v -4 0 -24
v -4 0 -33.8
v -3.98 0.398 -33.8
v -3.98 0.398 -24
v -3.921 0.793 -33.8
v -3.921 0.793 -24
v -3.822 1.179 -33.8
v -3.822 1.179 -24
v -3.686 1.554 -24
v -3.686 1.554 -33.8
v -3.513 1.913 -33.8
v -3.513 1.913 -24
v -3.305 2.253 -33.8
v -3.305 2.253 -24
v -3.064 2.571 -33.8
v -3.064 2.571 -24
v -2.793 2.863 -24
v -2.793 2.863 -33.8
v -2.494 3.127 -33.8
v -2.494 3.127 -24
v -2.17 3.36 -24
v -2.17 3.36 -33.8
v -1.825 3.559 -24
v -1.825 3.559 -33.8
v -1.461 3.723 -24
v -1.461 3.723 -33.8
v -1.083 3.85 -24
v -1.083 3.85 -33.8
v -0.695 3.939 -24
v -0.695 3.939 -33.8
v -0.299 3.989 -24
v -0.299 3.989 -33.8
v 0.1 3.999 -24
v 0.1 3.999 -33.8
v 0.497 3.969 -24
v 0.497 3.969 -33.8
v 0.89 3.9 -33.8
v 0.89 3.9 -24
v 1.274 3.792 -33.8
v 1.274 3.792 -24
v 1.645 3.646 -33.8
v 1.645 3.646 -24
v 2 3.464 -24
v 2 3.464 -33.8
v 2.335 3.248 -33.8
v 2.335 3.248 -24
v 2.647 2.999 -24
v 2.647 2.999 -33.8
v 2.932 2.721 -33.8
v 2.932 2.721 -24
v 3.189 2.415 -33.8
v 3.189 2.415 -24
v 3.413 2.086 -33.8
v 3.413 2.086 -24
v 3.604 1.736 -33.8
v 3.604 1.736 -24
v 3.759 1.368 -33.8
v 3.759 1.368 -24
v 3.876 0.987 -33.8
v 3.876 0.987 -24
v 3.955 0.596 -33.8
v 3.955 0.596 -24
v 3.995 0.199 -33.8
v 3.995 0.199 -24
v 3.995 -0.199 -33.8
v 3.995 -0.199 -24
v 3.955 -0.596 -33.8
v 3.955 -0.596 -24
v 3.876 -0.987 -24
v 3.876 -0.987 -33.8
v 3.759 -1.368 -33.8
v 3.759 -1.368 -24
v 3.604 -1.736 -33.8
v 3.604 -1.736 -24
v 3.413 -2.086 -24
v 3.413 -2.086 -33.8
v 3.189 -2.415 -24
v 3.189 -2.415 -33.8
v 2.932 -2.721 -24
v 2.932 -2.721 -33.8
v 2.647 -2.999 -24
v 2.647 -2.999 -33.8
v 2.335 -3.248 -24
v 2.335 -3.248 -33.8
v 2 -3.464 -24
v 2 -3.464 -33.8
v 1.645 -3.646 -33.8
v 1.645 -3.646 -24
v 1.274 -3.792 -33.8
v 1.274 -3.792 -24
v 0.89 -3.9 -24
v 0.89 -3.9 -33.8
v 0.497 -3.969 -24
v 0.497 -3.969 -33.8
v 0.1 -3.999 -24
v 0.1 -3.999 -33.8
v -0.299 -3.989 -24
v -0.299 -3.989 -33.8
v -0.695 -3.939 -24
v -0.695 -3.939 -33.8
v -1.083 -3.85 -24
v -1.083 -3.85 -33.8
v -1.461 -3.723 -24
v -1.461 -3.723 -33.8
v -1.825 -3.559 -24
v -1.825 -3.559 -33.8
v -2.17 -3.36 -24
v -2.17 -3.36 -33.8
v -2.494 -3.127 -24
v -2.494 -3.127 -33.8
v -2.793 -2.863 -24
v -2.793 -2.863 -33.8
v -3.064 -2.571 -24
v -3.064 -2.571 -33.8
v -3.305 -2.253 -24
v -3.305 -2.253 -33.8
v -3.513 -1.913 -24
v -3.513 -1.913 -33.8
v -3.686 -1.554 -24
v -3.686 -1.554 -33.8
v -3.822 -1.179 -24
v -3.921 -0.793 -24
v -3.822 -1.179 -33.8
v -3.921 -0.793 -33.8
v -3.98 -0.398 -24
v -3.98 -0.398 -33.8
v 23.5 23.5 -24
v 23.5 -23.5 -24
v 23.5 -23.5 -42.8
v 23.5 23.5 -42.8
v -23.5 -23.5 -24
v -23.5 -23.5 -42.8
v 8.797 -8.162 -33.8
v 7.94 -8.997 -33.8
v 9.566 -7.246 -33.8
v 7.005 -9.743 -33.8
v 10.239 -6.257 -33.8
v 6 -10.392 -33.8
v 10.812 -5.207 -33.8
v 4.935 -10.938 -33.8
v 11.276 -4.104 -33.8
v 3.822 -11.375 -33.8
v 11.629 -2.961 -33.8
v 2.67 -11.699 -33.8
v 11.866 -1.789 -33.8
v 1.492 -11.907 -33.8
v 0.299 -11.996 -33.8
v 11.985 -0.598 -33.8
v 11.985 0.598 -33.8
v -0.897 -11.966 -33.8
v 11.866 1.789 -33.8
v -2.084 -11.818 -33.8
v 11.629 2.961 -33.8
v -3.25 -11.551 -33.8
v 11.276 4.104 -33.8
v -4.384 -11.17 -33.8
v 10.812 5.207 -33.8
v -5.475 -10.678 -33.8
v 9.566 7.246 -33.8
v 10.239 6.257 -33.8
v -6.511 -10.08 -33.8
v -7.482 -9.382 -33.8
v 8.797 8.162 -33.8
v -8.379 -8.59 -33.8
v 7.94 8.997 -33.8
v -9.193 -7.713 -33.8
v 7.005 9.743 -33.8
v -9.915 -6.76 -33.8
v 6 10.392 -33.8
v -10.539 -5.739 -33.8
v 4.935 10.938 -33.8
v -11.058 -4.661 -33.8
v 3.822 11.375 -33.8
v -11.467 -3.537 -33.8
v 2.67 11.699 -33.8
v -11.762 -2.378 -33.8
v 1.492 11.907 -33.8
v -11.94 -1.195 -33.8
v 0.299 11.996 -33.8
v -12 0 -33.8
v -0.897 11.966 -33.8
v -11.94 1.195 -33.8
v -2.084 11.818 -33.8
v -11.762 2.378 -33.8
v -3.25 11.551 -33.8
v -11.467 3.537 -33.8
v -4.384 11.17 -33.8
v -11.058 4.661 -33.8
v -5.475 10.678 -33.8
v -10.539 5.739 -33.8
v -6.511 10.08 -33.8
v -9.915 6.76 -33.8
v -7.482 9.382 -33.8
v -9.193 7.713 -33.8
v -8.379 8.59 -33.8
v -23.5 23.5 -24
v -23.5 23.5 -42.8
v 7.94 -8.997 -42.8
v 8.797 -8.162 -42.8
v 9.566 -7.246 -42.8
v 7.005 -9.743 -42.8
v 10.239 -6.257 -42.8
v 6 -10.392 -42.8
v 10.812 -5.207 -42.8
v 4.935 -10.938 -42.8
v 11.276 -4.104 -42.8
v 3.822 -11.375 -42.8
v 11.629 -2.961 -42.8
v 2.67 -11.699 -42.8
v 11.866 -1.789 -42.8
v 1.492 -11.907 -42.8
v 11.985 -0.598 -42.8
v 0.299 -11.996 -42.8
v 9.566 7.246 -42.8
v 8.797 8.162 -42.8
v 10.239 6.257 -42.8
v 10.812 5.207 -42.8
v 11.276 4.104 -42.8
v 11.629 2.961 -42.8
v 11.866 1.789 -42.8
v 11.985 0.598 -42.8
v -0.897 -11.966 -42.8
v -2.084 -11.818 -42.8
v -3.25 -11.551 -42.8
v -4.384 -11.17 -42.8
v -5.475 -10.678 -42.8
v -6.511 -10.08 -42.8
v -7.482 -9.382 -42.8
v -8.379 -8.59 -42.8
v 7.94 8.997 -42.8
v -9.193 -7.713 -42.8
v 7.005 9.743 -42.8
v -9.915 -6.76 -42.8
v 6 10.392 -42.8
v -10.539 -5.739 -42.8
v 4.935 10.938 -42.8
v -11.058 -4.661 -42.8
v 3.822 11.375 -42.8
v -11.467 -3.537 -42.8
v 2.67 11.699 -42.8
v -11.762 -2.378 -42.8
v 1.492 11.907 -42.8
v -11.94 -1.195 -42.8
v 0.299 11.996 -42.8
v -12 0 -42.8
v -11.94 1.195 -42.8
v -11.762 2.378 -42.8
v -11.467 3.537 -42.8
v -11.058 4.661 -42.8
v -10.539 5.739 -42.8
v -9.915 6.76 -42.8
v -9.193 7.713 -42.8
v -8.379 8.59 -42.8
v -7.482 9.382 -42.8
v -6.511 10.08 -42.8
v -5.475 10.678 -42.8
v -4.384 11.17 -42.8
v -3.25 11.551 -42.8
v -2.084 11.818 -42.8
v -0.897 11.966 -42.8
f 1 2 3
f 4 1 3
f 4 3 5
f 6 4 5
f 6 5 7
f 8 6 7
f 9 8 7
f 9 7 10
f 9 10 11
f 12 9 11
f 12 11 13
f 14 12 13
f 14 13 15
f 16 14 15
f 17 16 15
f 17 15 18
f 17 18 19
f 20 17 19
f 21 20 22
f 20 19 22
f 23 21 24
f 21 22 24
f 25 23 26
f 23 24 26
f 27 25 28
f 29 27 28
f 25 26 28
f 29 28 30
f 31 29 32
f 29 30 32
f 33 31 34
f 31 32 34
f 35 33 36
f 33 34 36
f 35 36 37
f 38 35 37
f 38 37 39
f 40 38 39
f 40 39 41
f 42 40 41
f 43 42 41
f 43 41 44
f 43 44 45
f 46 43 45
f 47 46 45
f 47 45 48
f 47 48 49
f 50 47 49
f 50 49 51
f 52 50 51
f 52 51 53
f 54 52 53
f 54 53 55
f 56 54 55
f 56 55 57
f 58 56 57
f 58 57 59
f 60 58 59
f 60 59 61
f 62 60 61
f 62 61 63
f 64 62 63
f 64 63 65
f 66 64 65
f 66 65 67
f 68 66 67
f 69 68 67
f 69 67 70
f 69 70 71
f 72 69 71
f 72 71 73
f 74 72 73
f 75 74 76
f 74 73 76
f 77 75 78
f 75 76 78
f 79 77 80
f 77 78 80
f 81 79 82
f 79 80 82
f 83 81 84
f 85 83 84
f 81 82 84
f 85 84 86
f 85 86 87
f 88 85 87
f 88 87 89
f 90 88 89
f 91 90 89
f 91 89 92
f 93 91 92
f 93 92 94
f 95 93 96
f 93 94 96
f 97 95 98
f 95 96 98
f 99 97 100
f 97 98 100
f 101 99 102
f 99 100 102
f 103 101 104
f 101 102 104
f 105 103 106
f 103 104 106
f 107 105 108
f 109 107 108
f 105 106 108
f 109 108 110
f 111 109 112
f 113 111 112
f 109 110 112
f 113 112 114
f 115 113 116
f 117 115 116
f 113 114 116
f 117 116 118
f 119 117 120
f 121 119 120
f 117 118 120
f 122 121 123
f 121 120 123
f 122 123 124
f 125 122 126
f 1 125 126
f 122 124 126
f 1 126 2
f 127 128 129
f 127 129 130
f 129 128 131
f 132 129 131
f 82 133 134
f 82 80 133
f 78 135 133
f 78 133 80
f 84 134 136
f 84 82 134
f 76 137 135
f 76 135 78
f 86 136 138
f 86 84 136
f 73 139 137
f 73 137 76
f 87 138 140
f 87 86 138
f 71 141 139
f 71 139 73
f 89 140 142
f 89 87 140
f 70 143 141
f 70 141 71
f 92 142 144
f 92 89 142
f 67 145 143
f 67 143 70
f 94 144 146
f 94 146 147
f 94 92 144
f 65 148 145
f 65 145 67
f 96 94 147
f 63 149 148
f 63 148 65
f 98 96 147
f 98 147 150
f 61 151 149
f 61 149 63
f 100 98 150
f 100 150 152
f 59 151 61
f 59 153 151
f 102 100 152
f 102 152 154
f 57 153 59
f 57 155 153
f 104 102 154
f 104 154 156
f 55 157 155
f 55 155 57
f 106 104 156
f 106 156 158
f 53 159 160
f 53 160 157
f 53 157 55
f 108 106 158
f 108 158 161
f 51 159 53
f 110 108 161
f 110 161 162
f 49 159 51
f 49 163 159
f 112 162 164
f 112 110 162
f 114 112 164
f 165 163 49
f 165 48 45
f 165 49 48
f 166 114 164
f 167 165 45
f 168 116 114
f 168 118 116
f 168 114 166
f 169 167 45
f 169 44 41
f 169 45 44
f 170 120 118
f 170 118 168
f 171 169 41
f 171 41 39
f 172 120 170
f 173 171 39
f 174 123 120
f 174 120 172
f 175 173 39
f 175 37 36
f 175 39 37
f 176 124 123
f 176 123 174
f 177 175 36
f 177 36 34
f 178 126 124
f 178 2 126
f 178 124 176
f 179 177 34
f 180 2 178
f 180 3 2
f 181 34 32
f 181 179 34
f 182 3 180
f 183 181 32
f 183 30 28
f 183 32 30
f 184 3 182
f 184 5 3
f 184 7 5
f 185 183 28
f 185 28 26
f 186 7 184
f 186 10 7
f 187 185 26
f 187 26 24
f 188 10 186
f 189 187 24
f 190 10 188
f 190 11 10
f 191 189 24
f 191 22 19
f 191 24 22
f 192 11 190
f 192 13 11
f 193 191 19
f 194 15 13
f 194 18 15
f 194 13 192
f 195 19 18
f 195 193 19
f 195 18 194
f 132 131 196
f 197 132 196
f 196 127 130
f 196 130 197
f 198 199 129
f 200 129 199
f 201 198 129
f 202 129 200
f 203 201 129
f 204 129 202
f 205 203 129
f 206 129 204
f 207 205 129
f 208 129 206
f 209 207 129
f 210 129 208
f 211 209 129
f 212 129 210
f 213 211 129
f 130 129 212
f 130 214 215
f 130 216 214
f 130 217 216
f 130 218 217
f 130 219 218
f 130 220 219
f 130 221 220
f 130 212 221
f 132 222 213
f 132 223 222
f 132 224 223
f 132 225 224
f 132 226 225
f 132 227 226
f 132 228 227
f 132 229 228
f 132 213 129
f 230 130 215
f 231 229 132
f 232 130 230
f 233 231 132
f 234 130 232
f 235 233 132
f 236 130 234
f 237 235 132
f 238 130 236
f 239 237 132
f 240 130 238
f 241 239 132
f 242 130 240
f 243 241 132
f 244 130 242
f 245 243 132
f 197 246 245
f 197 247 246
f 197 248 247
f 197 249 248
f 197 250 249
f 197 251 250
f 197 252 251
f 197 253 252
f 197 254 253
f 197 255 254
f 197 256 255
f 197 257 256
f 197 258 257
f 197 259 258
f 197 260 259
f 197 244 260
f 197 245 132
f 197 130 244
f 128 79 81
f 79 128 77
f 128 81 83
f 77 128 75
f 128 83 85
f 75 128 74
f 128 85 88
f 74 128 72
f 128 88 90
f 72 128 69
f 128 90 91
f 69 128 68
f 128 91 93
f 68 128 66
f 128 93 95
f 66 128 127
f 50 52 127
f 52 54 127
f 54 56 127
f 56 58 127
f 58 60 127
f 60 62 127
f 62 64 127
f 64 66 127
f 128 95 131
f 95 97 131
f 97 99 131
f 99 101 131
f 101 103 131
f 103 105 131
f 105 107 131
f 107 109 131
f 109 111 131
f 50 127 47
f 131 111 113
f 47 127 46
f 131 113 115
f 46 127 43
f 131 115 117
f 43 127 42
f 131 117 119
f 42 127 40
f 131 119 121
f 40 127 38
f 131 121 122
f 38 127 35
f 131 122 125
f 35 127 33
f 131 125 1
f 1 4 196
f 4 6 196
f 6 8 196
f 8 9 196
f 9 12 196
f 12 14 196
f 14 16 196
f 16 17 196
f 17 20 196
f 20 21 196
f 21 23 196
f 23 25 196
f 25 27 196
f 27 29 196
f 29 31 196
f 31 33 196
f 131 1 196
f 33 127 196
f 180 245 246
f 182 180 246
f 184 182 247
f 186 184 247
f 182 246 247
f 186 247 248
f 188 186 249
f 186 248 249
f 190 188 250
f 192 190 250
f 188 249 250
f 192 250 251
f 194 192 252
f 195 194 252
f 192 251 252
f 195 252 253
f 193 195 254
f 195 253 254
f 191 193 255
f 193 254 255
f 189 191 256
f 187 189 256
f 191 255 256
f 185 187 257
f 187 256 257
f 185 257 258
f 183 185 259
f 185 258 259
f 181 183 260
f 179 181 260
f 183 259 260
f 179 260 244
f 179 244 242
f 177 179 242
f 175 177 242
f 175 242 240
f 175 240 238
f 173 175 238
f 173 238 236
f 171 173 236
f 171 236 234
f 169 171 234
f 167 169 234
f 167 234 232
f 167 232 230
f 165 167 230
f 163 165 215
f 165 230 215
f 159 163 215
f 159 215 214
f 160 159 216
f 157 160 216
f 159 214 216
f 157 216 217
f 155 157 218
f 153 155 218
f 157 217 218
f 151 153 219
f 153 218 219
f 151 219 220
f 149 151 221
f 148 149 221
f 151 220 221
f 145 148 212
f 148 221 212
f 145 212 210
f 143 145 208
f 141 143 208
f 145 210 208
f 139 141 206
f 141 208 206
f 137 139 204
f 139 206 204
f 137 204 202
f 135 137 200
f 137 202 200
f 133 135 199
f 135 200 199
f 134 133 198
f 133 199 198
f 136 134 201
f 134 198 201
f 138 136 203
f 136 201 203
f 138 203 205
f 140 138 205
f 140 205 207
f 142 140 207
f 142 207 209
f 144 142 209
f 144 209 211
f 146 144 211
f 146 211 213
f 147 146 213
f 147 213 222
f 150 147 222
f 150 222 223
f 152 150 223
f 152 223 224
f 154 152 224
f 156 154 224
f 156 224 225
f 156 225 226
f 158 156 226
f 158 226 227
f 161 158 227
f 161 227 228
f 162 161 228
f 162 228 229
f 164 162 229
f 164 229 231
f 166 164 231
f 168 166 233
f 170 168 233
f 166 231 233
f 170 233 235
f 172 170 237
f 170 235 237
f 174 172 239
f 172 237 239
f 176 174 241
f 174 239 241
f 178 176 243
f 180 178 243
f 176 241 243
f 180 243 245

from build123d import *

# Parameters (mm, degrees)
SKETCH048_W     = 47
SKETCH048_H     = 47
PAD020_DEPTH    = 18.8
SKETCH049_R     = 4
POCKET020_DEPTH = 18.801
SKETCH077_R     = 12
POCKET032_DEPTH = 9


with BuildPart() as part:
    # Sketch048 (on Face8 of ShapeBinder008) → Pad020 (new body)
    with BuildSketch(Plane(origin=(0, 0, -24), x_dir=(-1, 0, 0), z_dir=(0, 0, -1))):
        Rectangle(SKETCH048_W, SKETCH048_H)
    extrude(amount=PAD020_DEPTH)

    # Sketch049 (on Face6 of Pad020) → Pocket020 (cut, through all)
    with BuildSketch(Plane(origin=(0, 0, -42.8), x_dir=(-1, 0, 0), z_dir=(0, 0, -1))):
        Circle(SKETCH049_R)
    extrude(amount=-POCKET020_DEPTH, mode=Mode.SUBTRACT)

    # Sketch077 (on Face5 of Pocket020) → Pocket032 (cut)
    with BuildSketch(Plane(origin=(0, 0, -42.8), x_dir=(-1, 0, 0), z_dir=(0, 0, -1))):
        Circle(SKETCH077_R)
    extrude(amount=-POCKET032_DEPTH, mode=Mode.SUBTRACT)


solid = part.part
